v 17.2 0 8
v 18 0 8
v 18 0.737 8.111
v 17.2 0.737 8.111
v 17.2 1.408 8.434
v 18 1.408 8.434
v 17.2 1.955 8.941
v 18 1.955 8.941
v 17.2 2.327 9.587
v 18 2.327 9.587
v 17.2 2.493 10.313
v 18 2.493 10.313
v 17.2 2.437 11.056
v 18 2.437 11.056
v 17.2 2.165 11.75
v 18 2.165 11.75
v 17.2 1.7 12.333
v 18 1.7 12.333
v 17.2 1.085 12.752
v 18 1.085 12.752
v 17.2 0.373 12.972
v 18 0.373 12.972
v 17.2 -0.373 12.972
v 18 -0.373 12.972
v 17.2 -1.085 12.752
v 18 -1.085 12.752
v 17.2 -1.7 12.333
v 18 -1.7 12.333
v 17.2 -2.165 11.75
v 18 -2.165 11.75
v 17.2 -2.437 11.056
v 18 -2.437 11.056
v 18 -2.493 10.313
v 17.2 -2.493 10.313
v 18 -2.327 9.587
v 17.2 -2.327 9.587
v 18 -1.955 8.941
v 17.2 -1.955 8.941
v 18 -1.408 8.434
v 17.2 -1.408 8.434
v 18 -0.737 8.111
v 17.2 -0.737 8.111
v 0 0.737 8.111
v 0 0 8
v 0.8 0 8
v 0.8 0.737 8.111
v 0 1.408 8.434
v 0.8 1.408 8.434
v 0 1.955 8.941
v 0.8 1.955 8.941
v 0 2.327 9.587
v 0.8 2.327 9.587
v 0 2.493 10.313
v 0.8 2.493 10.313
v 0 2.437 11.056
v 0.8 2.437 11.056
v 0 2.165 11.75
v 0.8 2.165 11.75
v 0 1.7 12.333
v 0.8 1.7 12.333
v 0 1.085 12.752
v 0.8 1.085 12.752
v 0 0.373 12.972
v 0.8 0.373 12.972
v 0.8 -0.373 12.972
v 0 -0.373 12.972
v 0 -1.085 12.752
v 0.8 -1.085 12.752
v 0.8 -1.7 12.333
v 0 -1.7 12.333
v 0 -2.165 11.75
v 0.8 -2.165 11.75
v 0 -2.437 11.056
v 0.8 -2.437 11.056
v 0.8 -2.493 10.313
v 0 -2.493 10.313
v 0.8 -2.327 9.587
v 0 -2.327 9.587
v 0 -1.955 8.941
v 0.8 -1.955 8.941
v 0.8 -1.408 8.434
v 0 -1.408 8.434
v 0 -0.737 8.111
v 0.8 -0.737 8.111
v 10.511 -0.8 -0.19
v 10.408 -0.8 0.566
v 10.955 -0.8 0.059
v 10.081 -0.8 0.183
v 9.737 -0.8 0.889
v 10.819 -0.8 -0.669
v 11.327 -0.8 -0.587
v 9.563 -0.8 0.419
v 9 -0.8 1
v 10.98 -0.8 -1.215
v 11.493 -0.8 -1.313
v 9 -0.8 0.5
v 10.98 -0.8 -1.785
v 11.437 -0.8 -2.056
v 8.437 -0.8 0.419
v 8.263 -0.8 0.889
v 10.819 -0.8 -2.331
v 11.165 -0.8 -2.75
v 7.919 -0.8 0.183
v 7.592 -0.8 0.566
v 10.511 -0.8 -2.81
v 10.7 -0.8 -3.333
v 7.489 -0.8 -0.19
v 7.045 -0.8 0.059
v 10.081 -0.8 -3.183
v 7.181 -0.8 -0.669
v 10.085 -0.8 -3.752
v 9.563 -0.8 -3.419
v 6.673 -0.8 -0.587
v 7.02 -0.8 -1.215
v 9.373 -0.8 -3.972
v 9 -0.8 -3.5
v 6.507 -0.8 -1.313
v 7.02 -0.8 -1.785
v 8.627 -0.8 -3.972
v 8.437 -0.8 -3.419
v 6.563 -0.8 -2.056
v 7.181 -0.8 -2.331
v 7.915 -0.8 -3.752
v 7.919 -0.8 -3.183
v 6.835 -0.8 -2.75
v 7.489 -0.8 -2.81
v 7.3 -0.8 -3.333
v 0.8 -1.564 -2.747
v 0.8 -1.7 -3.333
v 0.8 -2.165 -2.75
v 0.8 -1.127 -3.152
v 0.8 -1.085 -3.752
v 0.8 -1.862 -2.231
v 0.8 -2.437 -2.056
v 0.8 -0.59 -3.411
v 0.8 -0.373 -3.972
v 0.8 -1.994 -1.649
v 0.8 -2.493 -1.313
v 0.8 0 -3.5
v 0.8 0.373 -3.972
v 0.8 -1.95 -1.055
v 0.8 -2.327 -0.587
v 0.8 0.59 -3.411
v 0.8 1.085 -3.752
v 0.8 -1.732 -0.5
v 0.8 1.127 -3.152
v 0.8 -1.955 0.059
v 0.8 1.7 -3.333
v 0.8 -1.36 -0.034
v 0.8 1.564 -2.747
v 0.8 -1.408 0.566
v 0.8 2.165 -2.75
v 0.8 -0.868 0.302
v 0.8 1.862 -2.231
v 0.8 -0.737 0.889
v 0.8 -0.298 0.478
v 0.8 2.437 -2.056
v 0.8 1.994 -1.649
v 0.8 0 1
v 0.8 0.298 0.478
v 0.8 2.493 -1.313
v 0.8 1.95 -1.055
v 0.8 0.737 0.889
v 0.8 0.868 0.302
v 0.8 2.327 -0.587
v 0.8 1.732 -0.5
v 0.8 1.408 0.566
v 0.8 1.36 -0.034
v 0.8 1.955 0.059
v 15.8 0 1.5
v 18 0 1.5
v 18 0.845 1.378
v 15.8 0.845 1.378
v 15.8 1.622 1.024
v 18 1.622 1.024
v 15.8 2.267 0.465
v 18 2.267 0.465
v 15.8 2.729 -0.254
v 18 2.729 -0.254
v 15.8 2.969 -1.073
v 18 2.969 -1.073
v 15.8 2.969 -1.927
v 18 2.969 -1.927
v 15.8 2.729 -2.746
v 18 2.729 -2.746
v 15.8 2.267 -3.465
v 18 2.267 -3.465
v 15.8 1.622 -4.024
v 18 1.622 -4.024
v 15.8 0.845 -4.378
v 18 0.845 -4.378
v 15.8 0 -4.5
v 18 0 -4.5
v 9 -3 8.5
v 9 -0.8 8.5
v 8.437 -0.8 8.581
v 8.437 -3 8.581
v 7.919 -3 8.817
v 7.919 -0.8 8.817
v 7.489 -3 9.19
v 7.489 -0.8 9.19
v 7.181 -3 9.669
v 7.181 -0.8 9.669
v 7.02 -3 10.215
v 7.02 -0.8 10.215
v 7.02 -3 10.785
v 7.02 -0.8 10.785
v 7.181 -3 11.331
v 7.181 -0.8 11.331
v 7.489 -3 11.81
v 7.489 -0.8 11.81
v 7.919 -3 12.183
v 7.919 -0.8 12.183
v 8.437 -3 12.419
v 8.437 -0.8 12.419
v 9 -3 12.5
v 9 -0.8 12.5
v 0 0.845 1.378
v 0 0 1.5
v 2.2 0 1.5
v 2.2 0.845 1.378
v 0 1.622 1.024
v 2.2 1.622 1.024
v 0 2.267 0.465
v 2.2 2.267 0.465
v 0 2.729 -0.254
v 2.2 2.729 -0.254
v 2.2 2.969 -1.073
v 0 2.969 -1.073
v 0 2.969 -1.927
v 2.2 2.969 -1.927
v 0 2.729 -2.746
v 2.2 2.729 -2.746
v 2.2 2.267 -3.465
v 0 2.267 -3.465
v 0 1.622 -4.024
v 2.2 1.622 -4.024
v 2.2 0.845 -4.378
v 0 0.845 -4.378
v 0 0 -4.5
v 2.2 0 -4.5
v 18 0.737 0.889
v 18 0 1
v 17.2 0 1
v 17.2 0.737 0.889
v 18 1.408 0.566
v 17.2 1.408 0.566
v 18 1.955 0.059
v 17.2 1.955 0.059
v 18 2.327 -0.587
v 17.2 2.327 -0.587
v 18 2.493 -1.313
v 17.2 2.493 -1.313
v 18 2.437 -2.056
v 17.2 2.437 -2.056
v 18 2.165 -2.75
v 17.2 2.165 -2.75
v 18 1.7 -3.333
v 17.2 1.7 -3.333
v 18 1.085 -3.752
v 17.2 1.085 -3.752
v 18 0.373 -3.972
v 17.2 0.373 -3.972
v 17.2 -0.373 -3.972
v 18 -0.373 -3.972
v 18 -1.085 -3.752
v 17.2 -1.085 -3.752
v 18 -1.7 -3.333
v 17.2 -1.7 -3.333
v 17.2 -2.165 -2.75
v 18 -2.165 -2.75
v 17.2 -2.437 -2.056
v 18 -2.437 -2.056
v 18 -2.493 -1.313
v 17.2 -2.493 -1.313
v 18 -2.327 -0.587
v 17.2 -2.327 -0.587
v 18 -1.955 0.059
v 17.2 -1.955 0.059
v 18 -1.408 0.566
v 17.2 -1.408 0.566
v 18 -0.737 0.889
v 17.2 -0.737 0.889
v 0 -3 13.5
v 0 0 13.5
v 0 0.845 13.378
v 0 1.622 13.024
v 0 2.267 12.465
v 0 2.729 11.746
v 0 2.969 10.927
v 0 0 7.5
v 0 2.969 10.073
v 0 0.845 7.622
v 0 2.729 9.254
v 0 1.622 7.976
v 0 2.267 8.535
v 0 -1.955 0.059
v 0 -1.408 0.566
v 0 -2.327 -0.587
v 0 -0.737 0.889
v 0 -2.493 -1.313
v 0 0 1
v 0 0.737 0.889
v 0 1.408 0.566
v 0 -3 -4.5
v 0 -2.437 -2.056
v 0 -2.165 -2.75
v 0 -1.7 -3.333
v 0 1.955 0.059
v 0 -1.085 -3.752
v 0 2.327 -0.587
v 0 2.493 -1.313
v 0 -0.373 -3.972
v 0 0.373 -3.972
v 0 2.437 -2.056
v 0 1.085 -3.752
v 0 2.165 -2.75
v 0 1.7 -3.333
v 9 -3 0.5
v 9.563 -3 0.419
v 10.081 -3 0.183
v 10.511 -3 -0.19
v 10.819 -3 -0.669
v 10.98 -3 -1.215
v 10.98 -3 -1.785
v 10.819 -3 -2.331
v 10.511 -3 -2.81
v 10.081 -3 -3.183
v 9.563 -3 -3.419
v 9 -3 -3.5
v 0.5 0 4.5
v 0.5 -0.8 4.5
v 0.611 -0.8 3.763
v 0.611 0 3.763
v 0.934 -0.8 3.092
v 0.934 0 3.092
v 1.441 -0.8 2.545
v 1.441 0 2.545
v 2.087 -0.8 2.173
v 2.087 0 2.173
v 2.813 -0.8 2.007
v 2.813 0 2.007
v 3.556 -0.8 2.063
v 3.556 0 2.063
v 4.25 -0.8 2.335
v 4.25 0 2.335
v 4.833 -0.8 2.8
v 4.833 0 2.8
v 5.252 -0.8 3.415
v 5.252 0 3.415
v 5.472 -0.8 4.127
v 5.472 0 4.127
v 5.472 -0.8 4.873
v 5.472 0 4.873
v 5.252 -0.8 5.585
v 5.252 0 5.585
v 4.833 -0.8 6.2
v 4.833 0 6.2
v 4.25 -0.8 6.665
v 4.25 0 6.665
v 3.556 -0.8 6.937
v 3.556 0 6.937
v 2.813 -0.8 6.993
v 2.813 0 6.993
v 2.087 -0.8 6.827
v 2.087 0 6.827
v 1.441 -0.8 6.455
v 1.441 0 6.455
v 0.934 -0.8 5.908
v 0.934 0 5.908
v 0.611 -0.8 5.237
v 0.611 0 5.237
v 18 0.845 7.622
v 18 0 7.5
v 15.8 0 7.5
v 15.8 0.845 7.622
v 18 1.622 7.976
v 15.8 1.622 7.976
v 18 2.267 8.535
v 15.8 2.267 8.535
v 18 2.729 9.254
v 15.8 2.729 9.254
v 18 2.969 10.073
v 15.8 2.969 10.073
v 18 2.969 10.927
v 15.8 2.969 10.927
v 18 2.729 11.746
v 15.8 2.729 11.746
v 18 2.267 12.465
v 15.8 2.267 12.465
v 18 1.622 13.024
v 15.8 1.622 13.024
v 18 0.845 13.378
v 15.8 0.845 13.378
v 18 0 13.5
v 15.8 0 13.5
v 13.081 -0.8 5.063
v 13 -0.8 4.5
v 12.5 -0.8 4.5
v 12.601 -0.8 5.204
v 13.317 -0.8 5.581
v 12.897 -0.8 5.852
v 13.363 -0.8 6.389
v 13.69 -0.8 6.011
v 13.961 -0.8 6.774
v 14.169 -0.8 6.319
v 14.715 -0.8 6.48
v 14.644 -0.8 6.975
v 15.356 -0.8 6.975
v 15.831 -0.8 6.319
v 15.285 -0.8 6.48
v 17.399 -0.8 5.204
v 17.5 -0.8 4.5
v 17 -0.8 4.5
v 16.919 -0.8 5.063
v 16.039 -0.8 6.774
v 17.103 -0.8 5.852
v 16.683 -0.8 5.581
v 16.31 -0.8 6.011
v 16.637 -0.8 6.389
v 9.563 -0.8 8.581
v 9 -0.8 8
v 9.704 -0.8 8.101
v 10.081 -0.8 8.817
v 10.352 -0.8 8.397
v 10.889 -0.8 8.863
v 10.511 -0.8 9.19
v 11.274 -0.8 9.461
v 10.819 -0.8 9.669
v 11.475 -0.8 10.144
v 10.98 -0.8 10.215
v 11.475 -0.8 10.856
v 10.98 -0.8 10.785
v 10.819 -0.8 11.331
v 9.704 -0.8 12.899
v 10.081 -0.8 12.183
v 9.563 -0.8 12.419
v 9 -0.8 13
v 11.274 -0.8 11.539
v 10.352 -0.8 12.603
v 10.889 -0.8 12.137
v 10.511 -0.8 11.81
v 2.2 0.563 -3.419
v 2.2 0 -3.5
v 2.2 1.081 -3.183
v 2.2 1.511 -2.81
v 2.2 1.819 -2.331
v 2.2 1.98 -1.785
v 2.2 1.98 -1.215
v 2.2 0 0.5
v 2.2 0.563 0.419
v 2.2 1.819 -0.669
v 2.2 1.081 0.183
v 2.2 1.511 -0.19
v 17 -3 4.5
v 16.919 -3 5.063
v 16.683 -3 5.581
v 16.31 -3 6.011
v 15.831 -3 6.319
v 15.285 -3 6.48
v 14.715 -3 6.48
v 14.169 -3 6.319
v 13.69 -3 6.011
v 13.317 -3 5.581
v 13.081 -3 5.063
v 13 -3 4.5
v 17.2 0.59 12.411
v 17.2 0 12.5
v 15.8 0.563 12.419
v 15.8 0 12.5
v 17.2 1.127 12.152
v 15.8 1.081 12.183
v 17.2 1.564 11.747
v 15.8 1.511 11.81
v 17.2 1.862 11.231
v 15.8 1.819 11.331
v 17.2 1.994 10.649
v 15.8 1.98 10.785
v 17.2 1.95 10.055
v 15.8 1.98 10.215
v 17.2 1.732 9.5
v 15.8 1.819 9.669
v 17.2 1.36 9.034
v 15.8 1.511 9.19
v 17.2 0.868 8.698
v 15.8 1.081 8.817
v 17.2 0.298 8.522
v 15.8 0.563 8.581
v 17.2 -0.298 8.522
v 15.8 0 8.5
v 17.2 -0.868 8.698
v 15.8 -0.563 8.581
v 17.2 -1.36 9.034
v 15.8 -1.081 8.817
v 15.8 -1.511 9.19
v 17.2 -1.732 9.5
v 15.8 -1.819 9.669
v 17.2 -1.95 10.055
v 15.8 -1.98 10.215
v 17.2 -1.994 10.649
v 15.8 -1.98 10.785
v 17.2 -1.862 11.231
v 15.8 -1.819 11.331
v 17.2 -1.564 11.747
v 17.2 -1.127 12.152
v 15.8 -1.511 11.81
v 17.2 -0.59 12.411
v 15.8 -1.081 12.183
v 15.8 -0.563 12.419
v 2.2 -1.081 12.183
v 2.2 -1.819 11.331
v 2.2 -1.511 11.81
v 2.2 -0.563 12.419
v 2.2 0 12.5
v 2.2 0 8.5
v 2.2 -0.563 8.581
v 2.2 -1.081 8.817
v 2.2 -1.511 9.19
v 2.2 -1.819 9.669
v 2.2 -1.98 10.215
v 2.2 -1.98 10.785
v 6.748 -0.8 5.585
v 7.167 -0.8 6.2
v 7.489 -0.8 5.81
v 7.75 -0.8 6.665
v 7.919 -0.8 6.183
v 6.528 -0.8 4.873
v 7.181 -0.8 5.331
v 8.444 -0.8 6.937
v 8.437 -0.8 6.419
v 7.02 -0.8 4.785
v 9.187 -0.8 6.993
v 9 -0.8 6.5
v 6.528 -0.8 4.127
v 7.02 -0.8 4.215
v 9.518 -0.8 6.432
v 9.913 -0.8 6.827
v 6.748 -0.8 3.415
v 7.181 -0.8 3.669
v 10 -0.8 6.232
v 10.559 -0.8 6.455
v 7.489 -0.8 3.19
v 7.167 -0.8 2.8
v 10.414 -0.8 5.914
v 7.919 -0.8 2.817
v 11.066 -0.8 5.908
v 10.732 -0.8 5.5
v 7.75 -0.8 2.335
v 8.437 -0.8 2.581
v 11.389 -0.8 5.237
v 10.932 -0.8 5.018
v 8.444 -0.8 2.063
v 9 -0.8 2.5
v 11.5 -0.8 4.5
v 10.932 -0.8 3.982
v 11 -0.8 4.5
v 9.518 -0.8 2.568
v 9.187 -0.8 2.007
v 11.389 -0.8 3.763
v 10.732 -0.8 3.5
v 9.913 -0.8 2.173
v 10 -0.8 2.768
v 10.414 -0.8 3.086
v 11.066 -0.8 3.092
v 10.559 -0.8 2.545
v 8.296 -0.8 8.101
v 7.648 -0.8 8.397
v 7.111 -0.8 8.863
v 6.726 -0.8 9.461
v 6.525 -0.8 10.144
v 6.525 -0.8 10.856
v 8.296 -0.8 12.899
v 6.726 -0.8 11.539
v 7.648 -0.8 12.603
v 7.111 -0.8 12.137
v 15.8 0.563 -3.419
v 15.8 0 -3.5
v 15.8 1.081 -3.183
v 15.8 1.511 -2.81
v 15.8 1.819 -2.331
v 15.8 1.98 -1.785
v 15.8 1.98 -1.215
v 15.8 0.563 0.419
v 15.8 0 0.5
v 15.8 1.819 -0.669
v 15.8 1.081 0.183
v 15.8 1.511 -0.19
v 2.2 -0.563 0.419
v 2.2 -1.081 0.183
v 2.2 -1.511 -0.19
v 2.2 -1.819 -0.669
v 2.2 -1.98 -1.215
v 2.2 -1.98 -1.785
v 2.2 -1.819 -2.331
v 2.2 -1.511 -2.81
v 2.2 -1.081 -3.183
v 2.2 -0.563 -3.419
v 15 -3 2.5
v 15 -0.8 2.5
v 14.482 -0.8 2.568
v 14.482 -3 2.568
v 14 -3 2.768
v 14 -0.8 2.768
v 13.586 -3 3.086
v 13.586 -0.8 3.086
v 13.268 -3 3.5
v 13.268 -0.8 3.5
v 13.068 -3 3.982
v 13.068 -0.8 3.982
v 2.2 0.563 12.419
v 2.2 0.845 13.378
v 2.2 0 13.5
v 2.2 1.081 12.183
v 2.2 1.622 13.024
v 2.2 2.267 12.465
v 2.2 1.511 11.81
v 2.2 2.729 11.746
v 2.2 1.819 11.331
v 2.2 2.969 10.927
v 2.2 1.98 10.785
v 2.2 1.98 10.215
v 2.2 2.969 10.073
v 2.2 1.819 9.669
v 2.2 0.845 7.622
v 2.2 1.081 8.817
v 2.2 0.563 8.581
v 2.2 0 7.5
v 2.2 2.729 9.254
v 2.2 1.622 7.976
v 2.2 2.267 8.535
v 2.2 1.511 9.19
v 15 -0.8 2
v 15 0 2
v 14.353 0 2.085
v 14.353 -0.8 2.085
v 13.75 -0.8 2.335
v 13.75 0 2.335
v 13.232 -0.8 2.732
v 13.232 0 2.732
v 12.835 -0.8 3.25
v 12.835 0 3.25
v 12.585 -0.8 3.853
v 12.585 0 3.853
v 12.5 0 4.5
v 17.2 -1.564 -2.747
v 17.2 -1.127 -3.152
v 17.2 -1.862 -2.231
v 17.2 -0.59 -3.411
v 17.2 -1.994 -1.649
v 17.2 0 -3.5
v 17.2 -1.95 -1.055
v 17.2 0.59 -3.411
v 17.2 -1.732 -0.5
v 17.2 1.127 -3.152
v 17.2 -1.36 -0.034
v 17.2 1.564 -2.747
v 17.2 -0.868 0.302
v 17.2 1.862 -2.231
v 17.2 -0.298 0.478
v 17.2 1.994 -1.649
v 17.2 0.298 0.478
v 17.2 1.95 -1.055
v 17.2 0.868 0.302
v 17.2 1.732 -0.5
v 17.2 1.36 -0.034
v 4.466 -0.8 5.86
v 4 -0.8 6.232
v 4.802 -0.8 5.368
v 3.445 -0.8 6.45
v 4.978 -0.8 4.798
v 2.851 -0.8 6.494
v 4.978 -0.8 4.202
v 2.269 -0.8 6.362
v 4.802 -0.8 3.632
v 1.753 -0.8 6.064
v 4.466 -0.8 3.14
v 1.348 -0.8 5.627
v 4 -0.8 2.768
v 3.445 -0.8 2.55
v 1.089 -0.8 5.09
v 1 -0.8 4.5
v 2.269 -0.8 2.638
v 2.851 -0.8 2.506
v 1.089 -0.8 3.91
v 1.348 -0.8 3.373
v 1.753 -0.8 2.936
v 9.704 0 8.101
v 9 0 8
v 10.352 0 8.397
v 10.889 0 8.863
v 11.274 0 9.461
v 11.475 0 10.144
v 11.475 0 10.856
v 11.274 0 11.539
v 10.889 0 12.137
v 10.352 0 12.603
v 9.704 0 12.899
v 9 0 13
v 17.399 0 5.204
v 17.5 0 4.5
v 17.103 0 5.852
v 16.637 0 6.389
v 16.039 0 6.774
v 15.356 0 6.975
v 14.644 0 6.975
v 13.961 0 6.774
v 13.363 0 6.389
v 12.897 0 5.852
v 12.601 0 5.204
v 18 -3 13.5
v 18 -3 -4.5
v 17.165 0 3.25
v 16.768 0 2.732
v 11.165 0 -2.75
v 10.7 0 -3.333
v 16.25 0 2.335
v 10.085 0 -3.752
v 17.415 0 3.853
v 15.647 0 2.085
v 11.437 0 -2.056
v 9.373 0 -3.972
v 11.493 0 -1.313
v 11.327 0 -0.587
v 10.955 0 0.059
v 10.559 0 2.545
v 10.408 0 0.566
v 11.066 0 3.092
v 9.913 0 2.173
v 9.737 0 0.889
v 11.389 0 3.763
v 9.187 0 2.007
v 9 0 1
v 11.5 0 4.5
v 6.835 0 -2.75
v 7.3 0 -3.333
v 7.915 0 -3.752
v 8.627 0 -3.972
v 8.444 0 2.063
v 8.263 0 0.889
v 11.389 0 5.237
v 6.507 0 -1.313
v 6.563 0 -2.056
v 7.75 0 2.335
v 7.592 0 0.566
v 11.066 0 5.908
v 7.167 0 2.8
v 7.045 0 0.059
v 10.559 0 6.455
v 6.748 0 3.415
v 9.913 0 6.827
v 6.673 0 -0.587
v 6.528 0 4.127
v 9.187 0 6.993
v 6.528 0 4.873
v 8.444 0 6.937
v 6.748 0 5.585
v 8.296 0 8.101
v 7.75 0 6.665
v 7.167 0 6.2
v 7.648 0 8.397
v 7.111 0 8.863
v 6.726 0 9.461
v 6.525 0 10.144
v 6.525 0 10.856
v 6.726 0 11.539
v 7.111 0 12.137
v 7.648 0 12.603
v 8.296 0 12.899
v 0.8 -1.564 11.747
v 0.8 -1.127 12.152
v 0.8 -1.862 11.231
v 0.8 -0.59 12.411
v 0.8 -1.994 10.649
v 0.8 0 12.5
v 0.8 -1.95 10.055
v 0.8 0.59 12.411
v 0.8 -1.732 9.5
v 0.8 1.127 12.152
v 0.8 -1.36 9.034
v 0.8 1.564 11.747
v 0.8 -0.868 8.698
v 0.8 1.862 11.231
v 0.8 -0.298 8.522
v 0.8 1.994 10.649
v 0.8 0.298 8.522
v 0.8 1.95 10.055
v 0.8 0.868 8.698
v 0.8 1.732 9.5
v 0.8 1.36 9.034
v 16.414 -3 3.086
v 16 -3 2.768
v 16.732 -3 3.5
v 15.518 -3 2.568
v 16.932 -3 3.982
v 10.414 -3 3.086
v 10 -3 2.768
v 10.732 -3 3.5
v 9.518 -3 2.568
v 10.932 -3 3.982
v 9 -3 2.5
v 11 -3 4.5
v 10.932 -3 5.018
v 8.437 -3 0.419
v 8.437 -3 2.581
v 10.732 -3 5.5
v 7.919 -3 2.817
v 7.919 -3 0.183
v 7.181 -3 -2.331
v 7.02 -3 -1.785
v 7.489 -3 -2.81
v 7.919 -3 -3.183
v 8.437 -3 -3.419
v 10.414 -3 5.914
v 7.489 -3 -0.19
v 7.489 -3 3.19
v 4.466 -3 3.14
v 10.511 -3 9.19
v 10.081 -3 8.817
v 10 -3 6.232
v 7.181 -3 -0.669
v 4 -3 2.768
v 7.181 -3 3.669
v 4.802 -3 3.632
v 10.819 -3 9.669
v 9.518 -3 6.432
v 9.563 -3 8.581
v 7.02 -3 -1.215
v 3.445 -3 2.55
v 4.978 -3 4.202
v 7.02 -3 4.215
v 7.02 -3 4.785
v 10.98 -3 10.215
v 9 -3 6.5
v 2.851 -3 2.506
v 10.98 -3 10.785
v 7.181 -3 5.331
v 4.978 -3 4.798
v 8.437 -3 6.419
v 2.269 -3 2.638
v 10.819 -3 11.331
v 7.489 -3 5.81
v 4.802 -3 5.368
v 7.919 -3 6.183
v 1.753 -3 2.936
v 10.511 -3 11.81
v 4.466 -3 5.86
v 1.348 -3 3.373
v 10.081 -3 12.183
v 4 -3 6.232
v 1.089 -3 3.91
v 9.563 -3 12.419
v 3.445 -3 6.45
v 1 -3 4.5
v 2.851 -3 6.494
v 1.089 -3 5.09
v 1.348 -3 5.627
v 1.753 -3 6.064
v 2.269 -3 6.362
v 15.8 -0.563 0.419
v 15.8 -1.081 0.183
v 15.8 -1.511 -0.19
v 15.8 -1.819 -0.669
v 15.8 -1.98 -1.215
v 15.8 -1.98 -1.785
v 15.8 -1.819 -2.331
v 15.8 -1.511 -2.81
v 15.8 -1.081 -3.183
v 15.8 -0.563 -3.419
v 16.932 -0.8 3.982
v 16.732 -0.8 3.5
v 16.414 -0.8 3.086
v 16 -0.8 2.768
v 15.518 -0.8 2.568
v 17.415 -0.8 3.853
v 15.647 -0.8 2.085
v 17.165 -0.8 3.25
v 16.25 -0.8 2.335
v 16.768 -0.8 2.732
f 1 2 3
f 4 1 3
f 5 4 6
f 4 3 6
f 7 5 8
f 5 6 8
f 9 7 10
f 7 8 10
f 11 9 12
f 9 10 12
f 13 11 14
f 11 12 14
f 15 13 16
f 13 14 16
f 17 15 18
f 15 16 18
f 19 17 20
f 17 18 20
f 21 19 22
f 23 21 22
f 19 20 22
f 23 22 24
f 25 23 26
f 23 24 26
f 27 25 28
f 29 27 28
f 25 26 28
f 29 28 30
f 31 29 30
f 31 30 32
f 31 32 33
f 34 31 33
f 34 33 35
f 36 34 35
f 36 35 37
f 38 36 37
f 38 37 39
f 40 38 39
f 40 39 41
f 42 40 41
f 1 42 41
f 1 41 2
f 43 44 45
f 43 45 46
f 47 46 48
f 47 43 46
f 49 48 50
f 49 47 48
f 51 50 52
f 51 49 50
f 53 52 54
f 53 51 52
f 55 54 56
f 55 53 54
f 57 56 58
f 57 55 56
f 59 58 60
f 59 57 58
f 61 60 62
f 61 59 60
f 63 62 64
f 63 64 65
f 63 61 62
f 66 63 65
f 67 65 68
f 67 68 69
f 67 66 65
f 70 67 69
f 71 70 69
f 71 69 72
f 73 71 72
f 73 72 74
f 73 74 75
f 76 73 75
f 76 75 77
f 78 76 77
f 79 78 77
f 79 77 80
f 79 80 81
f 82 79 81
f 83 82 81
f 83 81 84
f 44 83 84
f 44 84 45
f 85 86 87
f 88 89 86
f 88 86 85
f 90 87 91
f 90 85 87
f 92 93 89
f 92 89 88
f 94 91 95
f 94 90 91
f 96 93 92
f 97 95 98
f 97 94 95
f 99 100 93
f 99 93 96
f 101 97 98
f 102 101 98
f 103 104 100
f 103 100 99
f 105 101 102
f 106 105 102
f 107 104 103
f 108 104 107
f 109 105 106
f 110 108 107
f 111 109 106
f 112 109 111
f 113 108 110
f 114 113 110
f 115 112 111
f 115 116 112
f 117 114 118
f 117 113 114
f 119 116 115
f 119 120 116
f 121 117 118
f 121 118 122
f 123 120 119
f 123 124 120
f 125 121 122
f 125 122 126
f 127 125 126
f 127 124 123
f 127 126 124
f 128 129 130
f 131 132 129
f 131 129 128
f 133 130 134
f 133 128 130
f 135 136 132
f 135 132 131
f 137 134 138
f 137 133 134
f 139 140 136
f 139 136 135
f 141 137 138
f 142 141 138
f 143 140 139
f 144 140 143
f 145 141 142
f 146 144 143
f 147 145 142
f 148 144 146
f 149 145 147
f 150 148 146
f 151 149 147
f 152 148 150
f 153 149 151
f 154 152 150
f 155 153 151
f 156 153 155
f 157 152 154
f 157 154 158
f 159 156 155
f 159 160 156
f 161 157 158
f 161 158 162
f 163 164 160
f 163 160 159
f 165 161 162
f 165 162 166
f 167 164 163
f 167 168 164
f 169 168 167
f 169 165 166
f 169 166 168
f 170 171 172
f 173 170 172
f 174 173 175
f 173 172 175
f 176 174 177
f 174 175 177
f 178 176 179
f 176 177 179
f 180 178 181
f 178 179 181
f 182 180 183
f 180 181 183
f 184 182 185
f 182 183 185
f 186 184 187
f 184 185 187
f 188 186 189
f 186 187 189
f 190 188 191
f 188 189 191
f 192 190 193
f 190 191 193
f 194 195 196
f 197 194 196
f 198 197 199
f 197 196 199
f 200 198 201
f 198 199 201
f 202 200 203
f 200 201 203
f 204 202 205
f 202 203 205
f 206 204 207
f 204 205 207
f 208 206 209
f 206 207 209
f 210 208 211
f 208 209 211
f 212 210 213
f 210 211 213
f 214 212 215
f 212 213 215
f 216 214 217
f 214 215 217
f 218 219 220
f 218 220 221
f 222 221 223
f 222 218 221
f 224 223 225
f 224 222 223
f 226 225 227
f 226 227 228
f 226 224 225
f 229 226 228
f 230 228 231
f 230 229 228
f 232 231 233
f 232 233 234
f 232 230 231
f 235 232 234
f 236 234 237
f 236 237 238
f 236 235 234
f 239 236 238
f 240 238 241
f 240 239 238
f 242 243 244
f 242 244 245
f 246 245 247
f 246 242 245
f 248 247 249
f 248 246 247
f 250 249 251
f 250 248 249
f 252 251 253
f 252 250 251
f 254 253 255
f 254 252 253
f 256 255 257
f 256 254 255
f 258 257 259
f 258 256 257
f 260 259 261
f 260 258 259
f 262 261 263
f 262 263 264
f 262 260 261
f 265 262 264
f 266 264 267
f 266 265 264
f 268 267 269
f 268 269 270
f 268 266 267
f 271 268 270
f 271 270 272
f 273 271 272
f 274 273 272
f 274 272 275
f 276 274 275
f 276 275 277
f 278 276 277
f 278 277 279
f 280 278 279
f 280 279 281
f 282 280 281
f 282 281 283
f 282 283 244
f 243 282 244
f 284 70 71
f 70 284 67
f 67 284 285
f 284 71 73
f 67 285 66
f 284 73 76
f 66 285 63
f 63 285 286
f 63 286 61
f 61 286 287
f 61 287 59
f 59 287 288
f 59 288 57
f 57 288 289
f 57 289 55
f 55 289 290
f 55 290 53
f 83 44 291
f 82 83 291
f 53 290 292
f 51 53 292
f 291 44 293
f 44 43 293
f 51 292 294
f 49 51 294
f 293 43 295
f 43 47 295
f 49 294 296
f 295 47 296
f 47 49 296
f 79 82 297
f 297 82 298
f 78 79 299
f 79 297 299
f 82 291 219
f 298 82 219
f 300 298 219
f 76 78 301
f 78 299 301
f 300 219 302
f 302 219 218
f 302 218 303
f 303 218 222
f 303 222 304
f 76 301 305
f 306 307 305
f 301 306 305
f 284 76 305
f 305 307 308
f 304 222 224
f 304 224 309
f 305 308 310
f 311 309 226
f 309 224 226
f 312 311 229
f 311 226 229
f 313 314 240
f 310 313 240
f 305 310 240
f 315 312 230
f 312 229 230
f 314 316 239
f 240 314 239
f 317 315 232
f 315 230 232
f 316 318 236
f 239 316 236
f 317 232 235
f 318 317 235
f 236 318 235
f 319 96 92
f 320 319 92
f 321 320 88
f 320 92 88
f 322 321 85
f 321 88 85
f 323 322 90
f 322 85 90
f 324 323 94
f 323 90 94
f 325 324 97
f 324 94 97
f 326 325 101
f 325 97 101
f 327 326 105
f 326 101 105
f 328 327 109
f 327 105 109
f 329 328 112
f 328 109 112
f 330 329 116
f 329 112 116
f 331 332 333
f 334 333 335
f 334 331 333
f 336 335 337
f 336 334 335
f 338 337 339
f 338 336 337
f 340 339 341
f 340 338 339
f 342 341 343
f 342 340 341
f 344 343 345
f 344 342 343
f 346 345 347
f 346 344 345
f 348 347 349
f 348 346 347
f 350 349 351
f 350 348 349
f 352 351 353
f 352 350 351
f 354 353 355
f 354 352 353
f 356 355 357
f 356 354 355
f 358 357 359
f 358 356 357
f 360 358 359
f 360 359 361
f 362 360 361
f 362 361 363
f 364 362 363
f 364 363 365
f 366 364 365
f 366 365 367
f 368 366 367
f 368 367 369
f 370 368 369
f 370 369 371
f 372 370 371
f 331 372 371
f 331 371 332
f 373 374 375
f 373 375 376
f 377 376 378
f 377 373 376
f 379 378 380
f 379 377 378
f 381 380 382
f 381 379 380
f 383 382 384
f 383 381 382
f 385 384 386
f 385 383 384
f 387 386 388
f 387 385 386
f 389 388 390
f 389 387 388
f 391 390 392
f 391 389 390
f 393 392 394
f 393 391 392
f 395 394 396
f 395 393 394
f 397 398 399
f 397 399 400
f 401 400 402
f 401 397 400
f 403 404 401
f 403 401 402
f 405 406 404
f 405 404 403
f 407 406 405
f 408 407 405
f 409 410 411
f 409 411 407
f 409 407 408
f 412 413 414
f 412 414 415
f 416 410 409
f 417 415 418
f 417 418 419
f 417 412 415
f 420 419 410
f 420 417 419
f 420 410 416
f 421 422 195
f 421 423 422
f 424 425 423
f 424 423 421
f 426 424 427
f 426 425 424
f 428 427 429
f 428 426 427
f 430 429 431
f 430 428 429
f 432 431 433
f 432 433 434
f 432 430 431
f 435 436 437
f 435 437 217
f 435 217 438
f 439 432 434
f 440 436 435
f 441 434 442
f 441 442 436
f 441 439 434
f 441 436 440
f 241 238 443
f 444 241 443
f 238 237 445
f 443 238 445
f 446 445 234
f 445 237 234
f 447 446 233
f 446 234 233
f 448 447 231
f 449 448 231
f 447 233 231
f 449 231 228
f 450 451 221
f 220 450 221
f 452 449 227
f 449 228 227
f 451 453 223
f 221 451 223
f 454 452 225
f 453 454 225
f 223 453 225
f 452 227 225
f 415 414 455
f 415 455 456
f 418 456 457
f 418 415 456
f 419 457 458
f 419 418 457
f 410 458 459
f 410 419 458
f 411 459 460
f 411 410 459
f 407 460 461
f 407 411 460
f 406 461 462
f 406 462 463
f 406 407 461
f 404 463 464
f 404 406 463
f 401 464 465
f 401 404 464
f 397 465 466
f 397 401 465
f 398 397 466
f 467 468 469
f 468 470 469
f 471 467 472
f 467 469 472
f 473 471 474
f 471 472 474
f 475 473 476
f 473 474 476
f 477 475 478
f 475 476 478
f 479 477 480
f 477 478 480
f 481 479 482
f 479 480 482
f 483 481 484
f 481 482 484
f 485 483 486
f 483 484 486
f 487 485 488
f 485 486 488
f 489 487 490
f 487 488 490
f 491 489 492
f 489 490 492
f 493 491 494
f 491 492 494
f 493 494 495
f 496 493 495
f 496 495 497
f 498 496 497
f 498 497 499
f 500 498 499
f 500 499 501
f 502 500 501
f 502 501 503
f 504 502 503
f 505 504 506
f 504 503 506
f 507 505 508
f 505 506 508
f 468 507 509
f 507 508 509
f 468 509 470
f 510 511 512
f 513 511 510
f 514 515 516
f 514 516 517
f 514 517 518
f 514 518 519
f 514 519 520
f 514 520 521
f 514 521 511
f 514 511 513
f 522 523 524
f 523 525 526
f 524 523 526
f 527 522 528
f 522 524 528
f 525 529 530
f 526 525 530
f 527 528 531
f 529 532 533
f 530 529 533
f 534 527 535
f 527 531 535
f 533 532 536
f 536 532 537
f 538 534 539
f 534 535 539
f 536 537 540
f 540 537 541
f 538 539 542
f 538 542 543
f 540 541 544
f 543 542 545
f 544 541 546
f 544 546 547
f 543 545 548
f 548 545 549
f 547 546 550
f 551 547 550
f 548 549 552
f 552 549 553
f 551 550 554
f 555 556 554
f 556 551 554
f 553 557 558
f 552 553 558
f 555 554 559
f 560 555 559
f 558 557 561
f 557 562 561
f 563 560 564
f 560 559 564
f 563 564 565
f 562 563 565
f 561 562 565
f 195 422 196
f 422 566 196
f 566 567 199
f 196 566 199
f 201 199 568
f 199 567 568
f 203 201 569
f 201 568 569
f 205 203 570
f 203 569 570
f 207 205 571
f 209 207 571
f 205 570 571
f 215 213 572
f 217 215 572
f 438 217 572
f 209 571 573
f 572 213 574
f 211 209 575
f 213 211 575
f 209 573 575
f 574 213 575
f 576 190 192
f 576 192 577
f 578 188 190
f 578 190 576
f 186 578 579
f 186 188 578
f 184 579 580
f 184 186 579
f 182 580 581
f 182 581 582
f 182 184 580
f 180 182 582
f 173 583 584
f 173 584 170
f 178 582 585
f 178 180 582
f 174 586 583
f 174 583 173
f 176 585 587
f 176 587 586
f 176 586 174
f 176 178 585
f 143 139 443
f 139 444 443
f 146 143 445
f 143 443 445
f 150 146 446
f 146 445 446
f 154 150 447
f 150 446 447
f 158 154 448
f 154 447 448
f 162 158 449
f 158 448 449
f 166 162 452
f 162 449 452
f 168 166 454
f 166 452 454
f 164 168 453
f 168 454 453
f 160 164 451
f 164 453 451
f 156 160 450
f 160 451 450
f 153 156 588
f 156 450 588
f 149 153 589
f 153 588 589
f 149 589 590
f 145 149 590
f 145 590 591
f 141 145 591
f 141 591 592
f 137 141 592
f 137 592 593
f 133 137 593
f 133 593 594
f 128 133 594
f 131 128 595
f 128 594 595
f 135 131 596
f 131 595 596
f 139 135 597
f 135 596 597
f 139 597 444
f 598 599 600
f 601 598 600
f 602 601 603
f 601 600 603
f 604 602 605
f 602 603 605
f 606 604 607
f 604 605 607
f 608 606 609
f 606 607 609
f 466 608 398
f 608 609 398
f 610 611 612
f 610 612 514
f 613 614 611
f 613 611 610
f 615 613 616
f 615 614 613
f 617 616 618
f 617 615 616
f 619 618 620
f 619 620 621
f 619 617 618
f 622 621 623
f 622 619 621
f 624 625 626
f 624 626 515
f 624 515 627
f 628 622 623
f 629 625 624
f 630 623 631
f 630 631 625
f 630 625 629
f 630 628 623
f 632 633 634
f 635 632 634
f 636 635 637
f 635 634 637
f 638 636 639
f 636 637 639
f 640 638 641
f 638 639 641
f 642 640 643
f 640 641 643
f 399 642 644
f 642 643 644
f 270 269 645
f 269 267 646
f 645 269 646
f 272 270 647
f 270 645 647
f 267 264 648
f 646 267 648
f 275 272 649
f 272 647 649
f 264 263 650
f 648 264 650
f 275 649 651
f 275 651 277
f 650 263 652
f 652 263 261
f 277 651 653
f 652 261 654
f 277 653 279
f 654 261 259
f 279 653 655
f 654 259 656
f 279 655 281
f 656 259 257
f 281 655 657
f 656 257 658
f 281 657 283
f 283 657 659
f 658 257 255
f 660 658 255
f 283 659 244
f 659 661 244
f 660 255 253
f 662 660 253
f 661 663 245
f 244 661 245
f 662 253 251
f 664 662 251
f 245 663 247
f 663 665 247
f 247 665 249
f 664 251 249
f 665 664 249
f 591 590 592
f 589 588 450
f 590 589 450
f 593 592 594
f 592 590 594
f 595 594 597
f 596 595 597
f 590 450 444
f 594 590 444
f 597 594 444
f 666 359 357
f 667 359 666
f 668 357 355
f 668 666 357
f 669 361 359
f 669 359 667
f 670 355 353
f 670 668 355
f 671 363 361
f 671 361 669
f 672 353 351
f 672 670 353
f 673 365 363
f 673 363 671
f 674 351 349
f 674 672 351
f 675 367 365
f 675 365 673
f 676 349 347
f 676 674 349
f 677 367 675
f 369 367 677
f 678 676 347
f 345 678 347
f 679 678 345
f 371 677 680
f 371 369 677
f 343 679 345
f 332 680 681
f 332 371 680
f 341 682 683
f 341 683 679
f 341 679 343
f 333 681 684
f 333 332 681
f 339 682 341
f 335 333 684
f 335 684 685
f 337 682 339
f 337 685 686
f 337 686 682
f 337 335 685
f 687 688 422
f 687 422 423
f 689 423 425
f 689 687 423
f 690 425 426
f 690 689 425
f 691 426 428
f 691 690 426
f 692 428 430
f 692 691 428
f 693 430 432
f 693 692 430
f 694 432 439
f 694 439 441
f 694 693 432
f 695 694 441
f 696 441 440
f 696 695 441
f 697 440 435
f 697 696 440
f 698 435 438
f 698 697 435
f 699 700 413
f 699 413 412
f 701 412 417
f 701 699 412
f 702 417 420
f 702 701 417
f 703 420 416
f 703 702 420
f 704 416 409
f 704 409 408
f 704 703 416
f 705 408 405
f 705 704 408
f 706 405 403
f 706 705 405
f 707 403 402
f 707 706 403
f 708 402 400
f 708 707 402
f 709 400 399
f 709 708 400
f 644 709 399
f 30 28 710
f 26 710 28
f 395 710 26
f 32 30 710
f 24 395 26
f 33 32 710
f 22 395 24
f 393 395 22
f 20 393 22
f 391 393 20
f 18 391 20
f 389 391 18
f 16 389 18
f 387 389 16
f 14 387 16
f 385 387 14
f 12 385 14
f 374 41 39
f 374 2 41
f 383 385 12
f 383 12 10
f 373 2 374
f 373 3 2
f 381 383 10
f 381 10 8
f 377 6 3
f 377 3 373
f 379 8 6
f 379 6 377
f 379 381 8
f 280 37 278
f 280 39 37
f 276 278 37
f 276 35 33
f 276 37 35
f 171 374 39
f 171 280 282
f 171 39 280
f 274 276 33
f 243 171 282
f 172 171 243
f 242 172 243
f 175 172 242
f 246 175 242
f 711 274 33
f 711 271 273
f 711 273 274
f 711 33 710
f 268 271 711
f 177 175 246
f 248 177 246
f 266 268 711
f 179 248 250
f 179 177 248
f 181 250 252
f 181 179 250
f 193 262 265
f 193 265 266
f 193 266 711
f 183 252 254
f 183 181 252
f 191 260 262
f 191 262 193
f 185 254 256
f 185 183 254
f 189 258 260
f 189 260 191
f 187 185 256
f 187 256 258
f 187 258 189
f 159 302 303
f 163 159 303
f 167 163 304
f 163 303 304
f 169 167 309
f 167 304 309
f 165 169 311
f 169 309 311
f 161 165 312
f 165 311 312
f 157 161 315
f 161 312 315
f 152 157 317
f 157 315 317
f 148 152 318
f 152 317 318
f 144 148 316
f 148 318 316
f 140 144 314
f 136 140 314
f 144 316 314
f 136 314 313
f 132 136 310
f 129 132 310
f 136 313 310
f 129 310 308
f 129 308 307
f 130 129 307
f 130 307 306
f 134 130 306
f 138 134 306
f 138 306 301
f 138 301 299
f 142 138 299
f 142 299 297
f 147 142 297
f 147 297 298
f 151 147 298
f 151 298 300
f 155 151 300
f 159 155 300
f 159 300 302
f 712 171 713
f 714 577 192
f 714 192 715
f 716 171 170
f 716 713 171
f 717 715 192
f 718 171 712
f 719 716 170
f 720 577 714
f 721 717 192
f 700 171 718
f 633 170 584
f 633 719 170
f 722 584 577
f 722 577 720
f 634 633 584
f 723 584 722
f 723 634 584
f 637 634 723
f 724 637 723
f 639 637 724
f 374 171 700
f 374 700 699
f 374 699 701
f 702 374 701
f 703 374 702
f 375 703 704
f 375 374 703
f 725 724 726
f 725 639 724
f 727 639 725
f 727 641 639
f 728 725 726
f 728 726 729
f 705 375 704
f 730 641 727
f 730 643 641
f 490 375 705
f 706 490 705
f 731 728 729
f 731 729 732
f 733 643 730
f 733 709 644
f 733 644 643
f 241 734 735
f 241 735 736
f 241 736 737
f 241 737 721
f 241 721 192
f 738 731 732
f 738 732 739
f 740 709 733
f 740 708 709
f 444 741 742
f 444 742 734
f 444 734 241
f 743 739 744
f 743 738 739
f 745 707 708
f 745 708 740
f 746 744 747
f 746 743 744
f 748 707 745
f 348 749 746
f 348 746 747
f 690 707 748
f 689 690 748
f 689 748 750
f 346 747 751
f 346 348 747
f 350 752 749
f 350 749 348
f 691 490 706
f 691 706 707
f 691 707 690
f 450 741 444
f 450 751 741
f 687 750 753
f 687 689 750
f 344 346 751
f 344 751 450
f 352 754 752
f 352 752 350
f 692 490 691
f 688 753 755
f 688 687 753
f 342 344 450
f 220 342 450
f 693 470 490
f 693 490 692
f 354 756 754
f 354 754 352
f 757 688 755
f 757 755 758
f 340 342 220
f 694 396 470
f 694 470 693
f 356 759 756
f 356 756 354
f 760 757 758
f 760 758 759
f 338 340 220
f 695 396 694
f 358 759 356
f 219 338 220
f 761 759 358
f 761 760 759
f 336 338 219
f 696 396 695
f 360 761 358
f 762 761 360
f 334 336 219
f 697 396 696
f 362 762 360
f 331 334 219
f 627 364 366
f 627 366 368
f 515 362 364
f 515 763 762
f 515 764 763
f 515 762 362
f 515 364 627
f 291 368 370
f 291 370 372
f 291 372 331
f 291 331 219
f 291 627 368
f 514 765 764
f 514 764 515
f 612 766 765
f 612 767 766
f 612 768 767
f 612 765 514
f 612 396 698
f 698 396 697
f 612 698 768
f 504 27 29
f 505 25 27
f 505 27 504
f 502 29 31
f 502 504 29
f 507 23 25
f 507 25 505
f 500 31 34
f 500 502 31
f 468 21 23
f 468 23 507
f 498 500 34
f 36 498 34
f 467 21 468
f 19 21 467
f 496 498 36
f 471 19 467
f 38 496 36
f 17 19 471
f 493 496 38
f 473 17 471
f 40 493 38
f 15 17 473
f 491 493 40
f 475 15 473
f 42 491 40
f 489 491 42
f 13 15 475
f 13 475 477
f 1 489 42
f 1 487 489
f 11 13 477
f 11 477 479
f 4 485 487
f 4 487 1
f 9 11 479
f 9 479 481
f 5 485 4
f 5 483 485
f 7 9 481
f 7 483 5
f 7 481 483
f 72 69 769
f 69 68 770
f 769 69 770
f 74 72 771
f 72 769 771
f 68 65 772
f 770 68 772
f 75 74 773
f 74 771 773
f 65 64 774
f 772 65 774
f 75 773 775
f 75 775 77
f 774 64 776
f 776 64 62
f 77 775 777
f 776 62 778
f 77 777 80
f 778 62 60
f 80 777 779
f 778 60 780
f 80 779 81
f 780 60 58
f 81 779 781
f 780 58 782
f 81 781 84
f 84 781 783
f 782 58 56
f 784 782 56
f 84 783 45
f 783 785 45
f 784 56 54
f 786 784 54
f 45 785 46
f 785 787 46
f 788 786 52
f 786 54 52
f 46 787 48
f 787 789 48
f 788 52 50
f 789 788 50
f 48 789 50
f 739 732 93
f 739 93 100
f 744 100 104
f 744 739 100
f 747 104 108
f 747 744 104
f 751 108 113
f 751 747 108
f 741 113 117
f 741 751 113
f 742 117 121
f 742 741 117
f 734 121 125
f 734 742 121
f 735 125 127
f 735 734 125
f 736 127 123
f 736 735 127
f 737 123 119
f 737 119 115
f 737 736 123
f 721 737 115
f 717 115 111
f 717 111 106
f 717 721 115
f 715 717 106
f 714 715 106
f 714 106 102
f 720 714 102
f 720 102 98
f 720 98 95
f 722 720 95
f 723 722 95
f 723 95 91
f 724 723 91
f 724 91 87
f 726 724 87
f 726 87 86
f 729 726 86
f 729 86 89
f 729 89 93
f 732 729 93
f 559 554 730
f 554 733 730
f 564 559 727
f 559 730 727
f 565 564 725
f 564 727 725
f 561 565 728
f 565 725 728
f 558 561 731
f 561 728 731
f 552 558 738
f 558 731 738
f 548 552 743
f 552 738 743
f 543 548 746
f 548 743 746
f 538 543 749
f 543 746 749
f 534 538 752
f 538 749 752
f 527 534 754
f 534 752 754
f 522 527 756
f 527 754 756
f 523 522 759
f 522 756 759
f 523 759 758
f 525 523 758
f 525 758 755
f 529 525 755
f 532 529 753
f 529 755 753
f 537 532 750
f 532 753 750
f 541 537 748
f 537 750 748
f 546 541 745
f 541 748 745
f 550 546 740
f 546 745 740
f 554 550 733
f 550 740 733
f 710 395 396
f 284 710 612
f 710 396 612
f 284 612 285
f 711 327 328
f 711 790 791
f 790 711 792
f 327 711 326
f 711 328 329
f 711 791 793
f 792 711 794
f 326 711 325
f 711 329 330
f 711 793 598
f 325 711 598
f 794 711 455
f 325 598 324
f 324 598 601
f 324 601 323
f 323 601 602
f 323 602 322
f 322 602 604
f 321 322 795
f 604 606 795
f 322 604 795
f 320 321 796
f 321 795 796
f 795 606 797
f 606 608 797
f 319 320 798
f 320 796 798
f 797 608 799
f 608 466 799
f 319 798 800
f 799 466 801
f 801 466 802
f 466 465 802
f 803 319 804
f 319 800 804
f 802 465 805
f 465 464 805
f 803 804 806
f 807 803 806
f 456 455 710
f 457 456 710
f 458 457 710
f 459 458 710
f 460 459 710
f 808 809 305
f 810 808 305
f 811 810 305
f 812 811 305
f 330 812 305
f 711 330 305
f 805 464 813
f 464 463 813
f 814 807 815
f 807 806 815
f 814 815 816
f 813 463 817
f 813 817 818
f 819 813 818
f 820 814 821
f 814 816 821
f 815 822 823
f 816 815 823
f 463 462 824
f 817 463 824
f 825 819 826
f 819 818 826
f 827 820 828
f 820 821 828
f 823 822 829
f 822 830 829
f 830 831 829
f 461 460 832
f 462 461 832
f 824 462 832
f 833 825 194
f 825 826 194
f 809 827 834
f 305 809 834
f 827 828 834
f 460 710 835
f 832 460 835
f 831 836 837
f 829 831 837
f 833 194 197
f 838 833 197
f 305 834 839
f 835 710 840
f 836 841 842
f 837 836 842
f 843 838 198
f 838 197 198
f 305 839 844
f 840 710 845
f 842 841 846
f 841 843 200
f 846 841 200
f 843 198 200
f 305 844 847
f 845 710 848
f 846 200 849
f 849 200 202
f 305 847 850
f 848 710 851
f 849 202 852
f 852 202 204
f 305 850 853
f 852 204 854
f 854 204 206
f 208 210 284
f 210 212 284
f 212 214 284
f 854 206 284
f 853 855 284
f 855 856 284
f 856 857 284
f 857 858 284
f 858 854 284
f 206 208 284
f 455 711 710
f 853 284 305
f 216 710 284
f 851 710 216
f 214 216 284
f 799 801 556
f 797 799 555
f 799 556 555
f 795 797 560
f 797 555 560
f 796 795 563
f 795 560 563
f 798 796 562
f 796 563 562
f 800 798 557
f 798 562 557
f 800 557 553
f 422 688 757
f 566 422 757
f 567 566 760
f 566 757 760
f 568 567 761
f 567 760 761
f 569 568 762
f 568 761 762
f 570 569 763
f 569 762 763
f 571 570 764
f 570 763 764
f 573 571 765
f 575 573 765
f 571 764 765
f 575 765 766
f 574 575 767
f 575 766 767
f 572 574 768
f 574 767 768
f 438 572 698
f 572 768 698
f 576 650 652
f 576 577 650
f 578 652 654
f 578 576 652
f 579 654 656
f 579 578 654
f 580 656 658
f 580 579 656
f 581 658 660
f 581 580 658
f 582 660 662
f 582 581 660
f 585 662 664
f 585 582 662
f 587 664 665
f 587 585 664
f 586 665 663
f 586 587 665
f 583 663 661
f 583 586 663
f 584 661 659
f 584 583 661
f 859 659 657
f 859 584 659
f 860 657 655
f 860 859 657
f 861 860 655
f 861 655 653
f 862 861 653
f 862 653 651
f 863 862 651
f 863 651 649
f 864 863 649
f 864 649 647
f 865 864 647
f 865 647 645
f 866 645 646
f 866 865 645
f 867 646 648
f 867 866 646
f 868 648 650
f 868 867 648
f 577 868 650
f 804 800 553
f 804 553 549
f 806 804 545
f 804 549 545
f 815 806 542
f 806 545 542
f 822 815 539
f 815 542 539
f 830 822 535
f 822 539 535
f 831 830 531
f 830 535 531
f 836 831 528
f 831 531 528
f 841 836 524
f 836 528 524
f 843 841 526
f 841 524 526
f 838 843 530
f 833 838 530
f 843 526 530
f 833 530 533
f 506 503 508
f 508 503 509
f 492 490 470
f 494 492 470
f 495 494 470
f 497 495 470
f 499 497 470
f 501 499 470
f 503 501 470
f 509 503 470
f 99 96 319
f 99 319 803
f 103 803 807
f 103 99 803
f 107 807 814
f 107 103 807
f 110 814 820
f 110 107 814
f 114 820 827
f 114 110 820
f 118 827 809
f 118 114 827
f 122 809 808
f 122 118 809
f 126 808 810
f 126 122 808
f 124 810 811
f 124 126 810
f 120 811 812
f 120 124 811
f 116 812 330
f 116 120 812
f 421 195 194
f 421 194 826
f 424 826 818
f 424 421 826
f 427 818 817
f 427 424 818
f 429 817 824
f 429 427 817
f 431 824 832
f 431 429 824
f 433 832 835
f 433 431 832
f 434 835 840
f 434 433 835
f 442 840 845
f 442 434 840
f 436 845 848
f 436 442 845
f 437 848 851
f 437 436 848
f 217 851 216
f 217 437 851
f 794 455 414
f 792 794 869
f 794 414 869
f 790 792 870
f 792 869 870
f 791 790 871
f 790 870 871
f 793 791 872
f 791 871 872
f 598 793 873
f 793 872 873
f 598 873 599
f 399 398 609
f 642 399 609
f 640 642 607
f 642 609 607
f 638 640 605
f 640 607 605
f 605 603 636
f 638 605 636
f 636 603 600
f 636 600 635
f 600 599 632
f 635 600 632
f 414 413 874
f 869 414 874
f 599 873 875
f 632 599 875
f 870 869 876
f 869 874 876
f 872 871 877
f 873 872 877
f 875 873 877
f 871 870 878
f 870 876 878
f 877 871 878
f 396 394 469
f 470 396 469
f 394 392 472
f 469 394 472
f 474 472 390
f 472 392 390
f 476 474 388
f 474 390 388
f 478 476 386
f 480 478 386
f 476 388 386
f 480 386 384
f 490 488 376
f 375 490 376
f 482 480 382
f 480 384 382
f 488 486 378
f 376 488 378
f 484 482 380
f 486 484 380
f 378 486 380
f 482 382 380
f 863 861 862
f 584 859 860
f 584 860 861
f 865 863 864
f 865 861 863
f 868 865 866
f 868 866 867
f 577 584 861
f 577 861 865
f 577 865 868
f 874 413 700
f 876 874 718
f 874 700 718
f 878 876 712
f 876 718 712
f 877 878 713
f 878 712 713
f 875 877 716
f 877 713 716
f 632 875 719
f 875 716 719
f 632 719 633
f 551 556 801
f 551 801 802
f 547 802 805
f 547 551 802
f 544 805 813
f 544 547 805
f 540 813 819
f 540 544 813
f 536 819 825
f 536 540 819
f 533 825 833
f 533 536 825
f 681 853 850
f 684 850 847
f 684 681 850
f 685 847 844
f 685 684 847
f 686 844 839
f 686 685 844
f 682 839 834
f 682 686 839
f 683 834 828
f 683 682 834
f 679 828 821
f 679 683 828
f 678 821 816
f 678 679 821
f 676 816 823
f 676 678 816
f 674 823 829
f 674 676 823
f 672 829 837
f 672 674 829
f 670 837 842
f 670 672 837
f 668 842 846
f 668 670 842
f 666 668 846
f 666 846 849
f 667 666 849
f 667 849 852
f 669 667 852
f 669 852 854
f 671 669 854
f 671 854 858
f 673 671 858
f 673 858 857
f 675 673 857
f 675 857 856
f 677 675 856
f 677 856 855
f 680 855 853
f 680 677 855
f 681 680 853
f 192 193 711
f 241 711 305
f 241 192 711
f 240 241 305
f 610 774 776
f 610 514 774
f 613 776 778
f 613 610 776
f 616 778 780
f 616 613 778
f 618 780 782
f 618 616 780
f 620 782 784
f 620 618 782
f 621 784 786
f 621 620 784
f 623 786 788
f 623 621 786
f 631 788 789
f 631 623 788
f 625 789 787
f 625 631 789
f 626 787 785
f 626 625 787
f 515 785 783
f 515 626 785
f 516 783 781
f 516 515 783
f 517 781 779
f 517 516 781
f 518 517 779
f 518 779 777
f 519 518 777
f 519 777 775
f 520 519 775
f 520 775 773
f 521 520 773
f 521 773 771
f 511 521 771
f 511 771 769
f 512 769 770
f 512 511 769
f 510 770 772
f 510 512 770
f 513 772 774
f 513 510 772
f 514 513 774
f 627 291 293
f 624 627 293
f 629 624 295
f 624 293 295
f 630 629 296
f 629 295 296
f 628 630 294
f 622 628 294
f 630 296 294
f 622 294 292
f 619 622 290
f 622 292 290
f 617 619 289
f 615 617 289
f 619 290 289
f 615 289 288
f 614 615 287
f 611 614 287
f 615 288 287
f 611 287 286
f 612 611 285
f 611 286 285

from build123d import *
from build123d.topology import SkipClean

# Parameters (mm, degrees)
SKETCH1_W                  = 9
SKETCH1_H                  = 9
BOSS_EXTRUDE1_DEPTH        = 3
HOLE1_AT_2_COUNT           = 2
HOLE1_AT_2_PITCH           = 6
HOLE1_AT_3_COUNT           = 2
HOLE1_AT_3_PITCH           = 6
BOSS_EXTRUDE2_DEPTH        = 2.2
HOLE2_D                    = 4
HOLE2_DEPTH                = 2.2
HOLE2_CBORE_D              = 5
HOLE2_CBORE_DEPTH          = 0.8
MIRROR2_COPY_3_SKETCH_W    = 9
MIRROR2_COPY_3_SKETCH_H    = 9
MIRROR2_COPY_3_DEPTH       = 3
MIRROR2_COPY_5_DEPTH       = 2.2
MIRROR2_COPY_6_D           = 4
MIRROR2_COPY_6_DEPTH       = 2.2
MIRROR2_COPY_6_CBORE_D     = 5
MIRROR2_COPY_6_CBORE_DEPTH = 0.8


with BuildPart() as part:
    # Sketch1 → Boss-Extrude1 (new body)
    with BuildSketch(Plane(origin=(0, 0, 0), x_dir=(1, 0, 0), z_dir=(0, 1, 0))):
        with Locations((4.5, 0)):
            Rectangle(SKETCH1_W, SKETCH1_H)
    boss_extrude1 = extrude(amount=-BOSS_EXTRUDE1_DEPTH)

    # Sketch5 → Hole1 (revolve, cut)
    with BuildSketch(Plane(origin=(9, 0, 4.5), x_dir=(0, 0, 1), z_dir=(1, 0, 0))):
        Polygon((0, 0), (0, 4.201721238), (2, 3), (2, 0.8), (2.5, 0.8), (2.5, 0), align=None)
    hole1 = revolve(axis=Axis((9, 11.310875039, 4.5), (0, -1, 0)), mode=Mode.SUBTRACT)

    # Hole1 at 2: Hole1 ×2
    with Locations(*[(0, 0, -i * HOLE1_AT_2_PITCH) for i in range(1, HOLE1_AT_2_COUNT)]):
        add(hole1, mode=Mode.SUBTRACT)

    # Hole1 at 3: Hole1 ×2
    with Locations(*[(-i * HOLE1_AT_3_PITCH, 0, 0) for i in range(1, HOLE1_AT_3_COUNT)]):
        add(hole1, mode=Mode.SUBTRACT)

    # Sketch6 → Boss-Extrude2 (add)
    with BuildSketch(Plane(origin=(0, 0, 0), x_dir=(0, 0, -1), z_dir=(1, 0, 0))):
        with BuildLine():
            Line((4.5, 0), (-1.5, 0))
            ThreePointArc((-1.5, 0), (1.5, 3), (4.5, 0))
        make_face()
    boss_extrude2 = extrude(amount=BOSS_EXTRUDE2_DEPTH)

    # Hole2
    with Locations(Plane.ZY):
        with Locations((-1.5, 0)):
            hole2 = CounterBoreHole(HOLE2_D / 2, HOLE2_CBORE_D / 2, HOLE2_CBORE_DEPTH, depth=HOLE2_DEPTH)

    # Mirror1: Boss-Extrude1, Hole1, Boss-Extrude2, Hole2 across plane
    add(boss_extrude1.mirror(Plane.XY.offset(4.5)))
    add(hole1.mirror(Plane.XY.offset(4.5)), mode=Mode.SUBTRACT)
    add(boss_extrude2.mirror(Plane.XY.offset(4.5)))
    add(hole2.mirror(Plane.XY.offset(4.5)), mode=Mode.SUBTRACT)

    # Mirror1 copy 1 sketch → Mirror1 copy 1 (revolve, cut)
    with BuildSketch(Plane(origin=(9, 0, 10.5), x_dir=(0, 0, -1), z_dir=(1, 0, 0))):
        Polygon((0, 0), (0, -4.201721238), (2, -3), (2, -0.8), (2.5, -0.8), (2.5, 0), align=None)
    revolve(axis=Axis((9, 11.310875039, 10.5), (0, 1, 0)), mode=Mode.SUBTRACT)

    # Mirror1 copy 2 sketch → Mirror1 copy 2 (revolve, cut)
    with BuildSketch(Plane(origin=(3, 0, 4.5), x_dir=(0, 0, -1), z_dir=(1, 0, 0))):
        Polygon((0, 0), (0, -4.201721238), (2, -3), (2, -0.8), (2.5, -0.8), (2.5, 0), align=None)
    revolve(axis=Axis((3, 11.310875039, 4.5), (0, 1, 0)), mode=Mode.SUBTRACT)

    # Mirror2: Boss-Extrude1, Hole1, Boss-Extrude2, Hole2 across plane
    with SkipClean():  # the faces are left unmerged after this step: merging them gives an invalid solid
        add(boss_extrude1.mirror(Plane(origin=(9, 0, 0), x_dir=(0, 0, 1), z_dir=(1, 0, 0))))
        add(hole1.mirror(Plane(origin=(9, 0, 0), x_dir=(0, 0, 1), z_dir=(1, 0, 0))), mode=Mode.SUBTRACT)
        add(boss_extrude2.mirror(Plane(origin=(9, 0, 0), x_dir=(0, 0, 1), z_dir=(1, 0, 0))))
        add(hole2.mirror(Plane(origin=(9, 0, 0), x_dir=(0, 0, 1), z_dir=(1, 0, 0))), mode=Mode.SUBTRACT)

    # Mirror2 copy 1 sketch → Mirror2 copy 1 (revolve, cut)
    with SkipClean():  # the faces are left unmerged after this step: merging them gives an invalid solid
        with BuildSketch(Plane(origin=(9, 0, -1.5), x_dir=(0, 0, 1), z_dir=(-1, 0, 0))):
            Polygon((0, 0), (0, -4.201721238), (2, -3), (2, -0.8), (2.5, -0.8), (2.5, 0), align=None)
        revolve(axis=Axis((9, 11.310875039, -1.5), (0, 1, 0)), mode=Mode.SUBTRACT)
    add(part.part.scale(1), mode=Mode.REPLACE)  # the faces are merged on a copy

    # Mirror2 copy 2 sketch → Mirror2 copy 2 (revolve, cut)
    with BuildSketch(Plane(origin=(15, 0, 4.5), x_dir=(0, 0, 1), z_dir=(-1, 0, 0))):
        Polygon((0, 0), (0, -4.201721238), (2, -3), (2, -0.8), (2.5, -0.8), (2.5, 0), align=None)
    revolve(axis=Axis((15, 11.310875039, 4.5), (0, 1, 0)), mode=Mode.SUBTRACT)

    # Mirror2 copy 3 sketch → Mirror2 copy 3 (add)
    with BuildSketch(Plane(origin=(18, 0, 9), x_dir=(-1, 0, 0), z_dir=(0, 1, 0))):
        with Locations((4.5, 0)):
            Rectangle(MIRROR2_COPY_3_SKETCH_W, MIRROR2_COPY_3_SKETCH_H)
    extrude(amount=-MIRROR2_COPY_3_DEPTH)

    # Mirror2 copy 4 sketch → Mirror2 copy 4 (revolve, cut)
    with BuildSketch(Plane(origin=(9, 0, 4.5), x_dir=(0, 0, -1), z_dir=(-1, 0, 0))):
        Polygon((0, 0), (0, 4.201721238), (2, 3), (2, 0.8), (2.5, 0.8), (2.5, 0), align=None)
    revolve(axis=Axis((9, 11.310875039, 4.5), (0, -1, 0)), mode=Mode.SUBTRACT)

    # Mirror2 copy 5 sketch → Mirror2 copy 5 (add)
    with BuildSketch(Plane(origin=(18, 0, 9), x_dir=(0, 0, 1), z_dir=(-1, 0, 0))):
        with BuildLine():
            Line((4.5, 0), (-1.5, 0))
            ThreePointArc((-1.5, 0), (1.5, 3), (4.5, 0))
        make_face()
    extrude(amount=MIRROR2_COPY_5_DEPTH)

    # Mirror2 copy 6
    with Locations(Plane(origin=(18, 0, 9), x_dir=(0, 0, -1), z_dir=(1, 0, 0))):
        with Locations((-1.5, 0)):
            CounterBoreHole(MIRROR2_COPY_6_D / 2, MIRROR2_COPY_6_CBORE_D / 2, MIRROR2_COPY_6_CBORE_DEPTH, depth=MIRROR2_COPY_6_DEPTH)

    # Mirror2 copy 7 sketch → Mirror2 copy 7 (revolve, cut)
    with BuildSketch(Plane(origin=(9, 0, 10.5), x_dir=(0, 0, -1), z_dir=(-1, 0, 0))):
        Polygon((0, 0), (0, 4.201721238), (2, 3), (2, 0.8), (2.5, 0.8), (2.5, 0), align=None)
    revolve(axis=Axis((9, 11.310875039, 10.5), (0, -1, 0)), mode=Mode.SUBTRACT)

    # Mirror2 copy 8 sketch → Mirror2 copy 8 (revolve, cut)
    with SkipClean():  # the faces are left unmerged after this step: merging them gives an invalid solid
        with BuildSketch(Plane(origin=(15, 0, 4.5), x_dir=(0, 0, -1), z_dir=(-1, 0, 0))):
            Polygon((0, 0), (0, 4.201721238), (2, 3), (2, 0.8), (2.5, 0.8), (2.5, 0), align=None)
        revolve(axis=Axis((15, 11.310875039, 4.5), (0, -1, 0)), mode=Mode.SUBTRACT)
    add(part.part.scale(1), mode=Mode.REPLACE)  # the faces are merged on a copy


solid = part.part
